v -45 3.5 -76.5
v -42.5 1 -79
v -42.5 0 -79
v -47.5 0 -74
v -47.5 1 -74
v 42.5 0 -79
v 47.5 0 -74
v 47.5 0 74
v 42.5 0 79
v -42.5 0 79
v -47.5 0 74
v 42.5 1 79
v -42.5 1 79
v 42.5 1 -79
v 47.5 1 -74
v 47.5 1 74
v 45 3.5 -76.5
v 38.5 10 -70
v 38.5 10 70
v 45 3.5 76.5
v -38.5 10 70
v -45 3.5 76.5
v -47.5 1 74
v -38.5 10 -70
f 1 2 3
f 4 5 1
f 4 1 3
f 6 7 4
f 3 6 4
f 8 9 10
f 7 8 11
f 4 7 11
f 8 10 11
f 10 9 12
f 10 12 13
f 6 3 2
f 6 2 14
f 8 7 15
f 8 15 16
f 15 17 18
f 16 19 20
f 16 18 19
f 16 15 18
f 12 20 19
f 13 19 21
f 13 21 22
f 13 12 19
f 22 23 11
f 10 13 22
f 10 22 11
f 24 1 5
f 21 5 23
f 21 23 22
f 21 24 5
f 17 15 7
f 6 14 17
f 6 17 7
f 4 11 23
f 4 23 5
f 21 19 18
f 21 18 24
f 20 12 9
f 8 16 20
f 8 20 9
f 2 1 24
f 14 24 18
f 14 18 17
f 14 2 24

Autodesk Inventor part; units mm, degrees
ref_plane "YZ Plane" through (0, 0, 0) normal (1, 0, 0) x (0, 1, 0)
ref_plane "XZ Plane" through (0, 0, 0) normal (0, 1, 0) x (-1, 0, 0)
ref_plane "XY Plane" through (0, 0, 0) normal (0, 0, 1) x (1, 0, 0)
sketch "Эскиз1" plane through (0, 0, 0) normal (0, 1, 0) x (-1, 0, 0)
  line L0 (-47.5, 79) -> (47.5, 79)
  line L1 (47.5, 79) -> (47.5, -79)
  line L2 (47.5, -79) -> (-47.5, -79)
  line L3 (-47.5, -79) -> (-47.5, 79)
  line L4 (-47.5, 79) -> (47.5, -79) construction
  line L5 (47.5, 79) -> (-47.5, -79) construction
  point P0 (0, 0)
  dimension "d0" = 95
  dimension "d1" = 158
extrude "Выдавливание1" add sketch "Эскиз1" along normal blind 10
chamfer "Фаска1" distance 5 angle 45 1 edges at (47.5, 5, 79) measured on face at (47.5, 6.6667, 26.3333)
chamfer "Фаска2" distance 5 angle 45 1 edges at (47.5, 5, -79) measured on face at (15.8333, 3.3333, -79)
chamfer "Фаска3" distance 5 angle 45 1 edges at (-47.5, 5, -79) measured on face at (12.5, 3.3333, -79)
chamfer "Фаска4" distance 5 angle 45 1 edges at (-47.5, 5, 79) measured on face at (-17.5, 3.3333, 79)
chamfer "Фаска5" distance 9 angle 45 1 edges at (-47.5, 10, 0) measured on face at (15.8333, 10, 24.6667)
chamfer "Фаска6" distance 9 angle 45 1 edges at (2, 10, -79) measured on face at (-9.8333, 10, -24.6667)
chamfer "Фаска7" distance 9 angle 45 1 edges at (47.5, 10, 2) measured on face at (-9.8333, 10, 27.6667)
chamfer "Фаска8" distance 9 angle 45 1 edges at (0, 10, 79) measured on face at (12.8333, 10, -20.3333)
